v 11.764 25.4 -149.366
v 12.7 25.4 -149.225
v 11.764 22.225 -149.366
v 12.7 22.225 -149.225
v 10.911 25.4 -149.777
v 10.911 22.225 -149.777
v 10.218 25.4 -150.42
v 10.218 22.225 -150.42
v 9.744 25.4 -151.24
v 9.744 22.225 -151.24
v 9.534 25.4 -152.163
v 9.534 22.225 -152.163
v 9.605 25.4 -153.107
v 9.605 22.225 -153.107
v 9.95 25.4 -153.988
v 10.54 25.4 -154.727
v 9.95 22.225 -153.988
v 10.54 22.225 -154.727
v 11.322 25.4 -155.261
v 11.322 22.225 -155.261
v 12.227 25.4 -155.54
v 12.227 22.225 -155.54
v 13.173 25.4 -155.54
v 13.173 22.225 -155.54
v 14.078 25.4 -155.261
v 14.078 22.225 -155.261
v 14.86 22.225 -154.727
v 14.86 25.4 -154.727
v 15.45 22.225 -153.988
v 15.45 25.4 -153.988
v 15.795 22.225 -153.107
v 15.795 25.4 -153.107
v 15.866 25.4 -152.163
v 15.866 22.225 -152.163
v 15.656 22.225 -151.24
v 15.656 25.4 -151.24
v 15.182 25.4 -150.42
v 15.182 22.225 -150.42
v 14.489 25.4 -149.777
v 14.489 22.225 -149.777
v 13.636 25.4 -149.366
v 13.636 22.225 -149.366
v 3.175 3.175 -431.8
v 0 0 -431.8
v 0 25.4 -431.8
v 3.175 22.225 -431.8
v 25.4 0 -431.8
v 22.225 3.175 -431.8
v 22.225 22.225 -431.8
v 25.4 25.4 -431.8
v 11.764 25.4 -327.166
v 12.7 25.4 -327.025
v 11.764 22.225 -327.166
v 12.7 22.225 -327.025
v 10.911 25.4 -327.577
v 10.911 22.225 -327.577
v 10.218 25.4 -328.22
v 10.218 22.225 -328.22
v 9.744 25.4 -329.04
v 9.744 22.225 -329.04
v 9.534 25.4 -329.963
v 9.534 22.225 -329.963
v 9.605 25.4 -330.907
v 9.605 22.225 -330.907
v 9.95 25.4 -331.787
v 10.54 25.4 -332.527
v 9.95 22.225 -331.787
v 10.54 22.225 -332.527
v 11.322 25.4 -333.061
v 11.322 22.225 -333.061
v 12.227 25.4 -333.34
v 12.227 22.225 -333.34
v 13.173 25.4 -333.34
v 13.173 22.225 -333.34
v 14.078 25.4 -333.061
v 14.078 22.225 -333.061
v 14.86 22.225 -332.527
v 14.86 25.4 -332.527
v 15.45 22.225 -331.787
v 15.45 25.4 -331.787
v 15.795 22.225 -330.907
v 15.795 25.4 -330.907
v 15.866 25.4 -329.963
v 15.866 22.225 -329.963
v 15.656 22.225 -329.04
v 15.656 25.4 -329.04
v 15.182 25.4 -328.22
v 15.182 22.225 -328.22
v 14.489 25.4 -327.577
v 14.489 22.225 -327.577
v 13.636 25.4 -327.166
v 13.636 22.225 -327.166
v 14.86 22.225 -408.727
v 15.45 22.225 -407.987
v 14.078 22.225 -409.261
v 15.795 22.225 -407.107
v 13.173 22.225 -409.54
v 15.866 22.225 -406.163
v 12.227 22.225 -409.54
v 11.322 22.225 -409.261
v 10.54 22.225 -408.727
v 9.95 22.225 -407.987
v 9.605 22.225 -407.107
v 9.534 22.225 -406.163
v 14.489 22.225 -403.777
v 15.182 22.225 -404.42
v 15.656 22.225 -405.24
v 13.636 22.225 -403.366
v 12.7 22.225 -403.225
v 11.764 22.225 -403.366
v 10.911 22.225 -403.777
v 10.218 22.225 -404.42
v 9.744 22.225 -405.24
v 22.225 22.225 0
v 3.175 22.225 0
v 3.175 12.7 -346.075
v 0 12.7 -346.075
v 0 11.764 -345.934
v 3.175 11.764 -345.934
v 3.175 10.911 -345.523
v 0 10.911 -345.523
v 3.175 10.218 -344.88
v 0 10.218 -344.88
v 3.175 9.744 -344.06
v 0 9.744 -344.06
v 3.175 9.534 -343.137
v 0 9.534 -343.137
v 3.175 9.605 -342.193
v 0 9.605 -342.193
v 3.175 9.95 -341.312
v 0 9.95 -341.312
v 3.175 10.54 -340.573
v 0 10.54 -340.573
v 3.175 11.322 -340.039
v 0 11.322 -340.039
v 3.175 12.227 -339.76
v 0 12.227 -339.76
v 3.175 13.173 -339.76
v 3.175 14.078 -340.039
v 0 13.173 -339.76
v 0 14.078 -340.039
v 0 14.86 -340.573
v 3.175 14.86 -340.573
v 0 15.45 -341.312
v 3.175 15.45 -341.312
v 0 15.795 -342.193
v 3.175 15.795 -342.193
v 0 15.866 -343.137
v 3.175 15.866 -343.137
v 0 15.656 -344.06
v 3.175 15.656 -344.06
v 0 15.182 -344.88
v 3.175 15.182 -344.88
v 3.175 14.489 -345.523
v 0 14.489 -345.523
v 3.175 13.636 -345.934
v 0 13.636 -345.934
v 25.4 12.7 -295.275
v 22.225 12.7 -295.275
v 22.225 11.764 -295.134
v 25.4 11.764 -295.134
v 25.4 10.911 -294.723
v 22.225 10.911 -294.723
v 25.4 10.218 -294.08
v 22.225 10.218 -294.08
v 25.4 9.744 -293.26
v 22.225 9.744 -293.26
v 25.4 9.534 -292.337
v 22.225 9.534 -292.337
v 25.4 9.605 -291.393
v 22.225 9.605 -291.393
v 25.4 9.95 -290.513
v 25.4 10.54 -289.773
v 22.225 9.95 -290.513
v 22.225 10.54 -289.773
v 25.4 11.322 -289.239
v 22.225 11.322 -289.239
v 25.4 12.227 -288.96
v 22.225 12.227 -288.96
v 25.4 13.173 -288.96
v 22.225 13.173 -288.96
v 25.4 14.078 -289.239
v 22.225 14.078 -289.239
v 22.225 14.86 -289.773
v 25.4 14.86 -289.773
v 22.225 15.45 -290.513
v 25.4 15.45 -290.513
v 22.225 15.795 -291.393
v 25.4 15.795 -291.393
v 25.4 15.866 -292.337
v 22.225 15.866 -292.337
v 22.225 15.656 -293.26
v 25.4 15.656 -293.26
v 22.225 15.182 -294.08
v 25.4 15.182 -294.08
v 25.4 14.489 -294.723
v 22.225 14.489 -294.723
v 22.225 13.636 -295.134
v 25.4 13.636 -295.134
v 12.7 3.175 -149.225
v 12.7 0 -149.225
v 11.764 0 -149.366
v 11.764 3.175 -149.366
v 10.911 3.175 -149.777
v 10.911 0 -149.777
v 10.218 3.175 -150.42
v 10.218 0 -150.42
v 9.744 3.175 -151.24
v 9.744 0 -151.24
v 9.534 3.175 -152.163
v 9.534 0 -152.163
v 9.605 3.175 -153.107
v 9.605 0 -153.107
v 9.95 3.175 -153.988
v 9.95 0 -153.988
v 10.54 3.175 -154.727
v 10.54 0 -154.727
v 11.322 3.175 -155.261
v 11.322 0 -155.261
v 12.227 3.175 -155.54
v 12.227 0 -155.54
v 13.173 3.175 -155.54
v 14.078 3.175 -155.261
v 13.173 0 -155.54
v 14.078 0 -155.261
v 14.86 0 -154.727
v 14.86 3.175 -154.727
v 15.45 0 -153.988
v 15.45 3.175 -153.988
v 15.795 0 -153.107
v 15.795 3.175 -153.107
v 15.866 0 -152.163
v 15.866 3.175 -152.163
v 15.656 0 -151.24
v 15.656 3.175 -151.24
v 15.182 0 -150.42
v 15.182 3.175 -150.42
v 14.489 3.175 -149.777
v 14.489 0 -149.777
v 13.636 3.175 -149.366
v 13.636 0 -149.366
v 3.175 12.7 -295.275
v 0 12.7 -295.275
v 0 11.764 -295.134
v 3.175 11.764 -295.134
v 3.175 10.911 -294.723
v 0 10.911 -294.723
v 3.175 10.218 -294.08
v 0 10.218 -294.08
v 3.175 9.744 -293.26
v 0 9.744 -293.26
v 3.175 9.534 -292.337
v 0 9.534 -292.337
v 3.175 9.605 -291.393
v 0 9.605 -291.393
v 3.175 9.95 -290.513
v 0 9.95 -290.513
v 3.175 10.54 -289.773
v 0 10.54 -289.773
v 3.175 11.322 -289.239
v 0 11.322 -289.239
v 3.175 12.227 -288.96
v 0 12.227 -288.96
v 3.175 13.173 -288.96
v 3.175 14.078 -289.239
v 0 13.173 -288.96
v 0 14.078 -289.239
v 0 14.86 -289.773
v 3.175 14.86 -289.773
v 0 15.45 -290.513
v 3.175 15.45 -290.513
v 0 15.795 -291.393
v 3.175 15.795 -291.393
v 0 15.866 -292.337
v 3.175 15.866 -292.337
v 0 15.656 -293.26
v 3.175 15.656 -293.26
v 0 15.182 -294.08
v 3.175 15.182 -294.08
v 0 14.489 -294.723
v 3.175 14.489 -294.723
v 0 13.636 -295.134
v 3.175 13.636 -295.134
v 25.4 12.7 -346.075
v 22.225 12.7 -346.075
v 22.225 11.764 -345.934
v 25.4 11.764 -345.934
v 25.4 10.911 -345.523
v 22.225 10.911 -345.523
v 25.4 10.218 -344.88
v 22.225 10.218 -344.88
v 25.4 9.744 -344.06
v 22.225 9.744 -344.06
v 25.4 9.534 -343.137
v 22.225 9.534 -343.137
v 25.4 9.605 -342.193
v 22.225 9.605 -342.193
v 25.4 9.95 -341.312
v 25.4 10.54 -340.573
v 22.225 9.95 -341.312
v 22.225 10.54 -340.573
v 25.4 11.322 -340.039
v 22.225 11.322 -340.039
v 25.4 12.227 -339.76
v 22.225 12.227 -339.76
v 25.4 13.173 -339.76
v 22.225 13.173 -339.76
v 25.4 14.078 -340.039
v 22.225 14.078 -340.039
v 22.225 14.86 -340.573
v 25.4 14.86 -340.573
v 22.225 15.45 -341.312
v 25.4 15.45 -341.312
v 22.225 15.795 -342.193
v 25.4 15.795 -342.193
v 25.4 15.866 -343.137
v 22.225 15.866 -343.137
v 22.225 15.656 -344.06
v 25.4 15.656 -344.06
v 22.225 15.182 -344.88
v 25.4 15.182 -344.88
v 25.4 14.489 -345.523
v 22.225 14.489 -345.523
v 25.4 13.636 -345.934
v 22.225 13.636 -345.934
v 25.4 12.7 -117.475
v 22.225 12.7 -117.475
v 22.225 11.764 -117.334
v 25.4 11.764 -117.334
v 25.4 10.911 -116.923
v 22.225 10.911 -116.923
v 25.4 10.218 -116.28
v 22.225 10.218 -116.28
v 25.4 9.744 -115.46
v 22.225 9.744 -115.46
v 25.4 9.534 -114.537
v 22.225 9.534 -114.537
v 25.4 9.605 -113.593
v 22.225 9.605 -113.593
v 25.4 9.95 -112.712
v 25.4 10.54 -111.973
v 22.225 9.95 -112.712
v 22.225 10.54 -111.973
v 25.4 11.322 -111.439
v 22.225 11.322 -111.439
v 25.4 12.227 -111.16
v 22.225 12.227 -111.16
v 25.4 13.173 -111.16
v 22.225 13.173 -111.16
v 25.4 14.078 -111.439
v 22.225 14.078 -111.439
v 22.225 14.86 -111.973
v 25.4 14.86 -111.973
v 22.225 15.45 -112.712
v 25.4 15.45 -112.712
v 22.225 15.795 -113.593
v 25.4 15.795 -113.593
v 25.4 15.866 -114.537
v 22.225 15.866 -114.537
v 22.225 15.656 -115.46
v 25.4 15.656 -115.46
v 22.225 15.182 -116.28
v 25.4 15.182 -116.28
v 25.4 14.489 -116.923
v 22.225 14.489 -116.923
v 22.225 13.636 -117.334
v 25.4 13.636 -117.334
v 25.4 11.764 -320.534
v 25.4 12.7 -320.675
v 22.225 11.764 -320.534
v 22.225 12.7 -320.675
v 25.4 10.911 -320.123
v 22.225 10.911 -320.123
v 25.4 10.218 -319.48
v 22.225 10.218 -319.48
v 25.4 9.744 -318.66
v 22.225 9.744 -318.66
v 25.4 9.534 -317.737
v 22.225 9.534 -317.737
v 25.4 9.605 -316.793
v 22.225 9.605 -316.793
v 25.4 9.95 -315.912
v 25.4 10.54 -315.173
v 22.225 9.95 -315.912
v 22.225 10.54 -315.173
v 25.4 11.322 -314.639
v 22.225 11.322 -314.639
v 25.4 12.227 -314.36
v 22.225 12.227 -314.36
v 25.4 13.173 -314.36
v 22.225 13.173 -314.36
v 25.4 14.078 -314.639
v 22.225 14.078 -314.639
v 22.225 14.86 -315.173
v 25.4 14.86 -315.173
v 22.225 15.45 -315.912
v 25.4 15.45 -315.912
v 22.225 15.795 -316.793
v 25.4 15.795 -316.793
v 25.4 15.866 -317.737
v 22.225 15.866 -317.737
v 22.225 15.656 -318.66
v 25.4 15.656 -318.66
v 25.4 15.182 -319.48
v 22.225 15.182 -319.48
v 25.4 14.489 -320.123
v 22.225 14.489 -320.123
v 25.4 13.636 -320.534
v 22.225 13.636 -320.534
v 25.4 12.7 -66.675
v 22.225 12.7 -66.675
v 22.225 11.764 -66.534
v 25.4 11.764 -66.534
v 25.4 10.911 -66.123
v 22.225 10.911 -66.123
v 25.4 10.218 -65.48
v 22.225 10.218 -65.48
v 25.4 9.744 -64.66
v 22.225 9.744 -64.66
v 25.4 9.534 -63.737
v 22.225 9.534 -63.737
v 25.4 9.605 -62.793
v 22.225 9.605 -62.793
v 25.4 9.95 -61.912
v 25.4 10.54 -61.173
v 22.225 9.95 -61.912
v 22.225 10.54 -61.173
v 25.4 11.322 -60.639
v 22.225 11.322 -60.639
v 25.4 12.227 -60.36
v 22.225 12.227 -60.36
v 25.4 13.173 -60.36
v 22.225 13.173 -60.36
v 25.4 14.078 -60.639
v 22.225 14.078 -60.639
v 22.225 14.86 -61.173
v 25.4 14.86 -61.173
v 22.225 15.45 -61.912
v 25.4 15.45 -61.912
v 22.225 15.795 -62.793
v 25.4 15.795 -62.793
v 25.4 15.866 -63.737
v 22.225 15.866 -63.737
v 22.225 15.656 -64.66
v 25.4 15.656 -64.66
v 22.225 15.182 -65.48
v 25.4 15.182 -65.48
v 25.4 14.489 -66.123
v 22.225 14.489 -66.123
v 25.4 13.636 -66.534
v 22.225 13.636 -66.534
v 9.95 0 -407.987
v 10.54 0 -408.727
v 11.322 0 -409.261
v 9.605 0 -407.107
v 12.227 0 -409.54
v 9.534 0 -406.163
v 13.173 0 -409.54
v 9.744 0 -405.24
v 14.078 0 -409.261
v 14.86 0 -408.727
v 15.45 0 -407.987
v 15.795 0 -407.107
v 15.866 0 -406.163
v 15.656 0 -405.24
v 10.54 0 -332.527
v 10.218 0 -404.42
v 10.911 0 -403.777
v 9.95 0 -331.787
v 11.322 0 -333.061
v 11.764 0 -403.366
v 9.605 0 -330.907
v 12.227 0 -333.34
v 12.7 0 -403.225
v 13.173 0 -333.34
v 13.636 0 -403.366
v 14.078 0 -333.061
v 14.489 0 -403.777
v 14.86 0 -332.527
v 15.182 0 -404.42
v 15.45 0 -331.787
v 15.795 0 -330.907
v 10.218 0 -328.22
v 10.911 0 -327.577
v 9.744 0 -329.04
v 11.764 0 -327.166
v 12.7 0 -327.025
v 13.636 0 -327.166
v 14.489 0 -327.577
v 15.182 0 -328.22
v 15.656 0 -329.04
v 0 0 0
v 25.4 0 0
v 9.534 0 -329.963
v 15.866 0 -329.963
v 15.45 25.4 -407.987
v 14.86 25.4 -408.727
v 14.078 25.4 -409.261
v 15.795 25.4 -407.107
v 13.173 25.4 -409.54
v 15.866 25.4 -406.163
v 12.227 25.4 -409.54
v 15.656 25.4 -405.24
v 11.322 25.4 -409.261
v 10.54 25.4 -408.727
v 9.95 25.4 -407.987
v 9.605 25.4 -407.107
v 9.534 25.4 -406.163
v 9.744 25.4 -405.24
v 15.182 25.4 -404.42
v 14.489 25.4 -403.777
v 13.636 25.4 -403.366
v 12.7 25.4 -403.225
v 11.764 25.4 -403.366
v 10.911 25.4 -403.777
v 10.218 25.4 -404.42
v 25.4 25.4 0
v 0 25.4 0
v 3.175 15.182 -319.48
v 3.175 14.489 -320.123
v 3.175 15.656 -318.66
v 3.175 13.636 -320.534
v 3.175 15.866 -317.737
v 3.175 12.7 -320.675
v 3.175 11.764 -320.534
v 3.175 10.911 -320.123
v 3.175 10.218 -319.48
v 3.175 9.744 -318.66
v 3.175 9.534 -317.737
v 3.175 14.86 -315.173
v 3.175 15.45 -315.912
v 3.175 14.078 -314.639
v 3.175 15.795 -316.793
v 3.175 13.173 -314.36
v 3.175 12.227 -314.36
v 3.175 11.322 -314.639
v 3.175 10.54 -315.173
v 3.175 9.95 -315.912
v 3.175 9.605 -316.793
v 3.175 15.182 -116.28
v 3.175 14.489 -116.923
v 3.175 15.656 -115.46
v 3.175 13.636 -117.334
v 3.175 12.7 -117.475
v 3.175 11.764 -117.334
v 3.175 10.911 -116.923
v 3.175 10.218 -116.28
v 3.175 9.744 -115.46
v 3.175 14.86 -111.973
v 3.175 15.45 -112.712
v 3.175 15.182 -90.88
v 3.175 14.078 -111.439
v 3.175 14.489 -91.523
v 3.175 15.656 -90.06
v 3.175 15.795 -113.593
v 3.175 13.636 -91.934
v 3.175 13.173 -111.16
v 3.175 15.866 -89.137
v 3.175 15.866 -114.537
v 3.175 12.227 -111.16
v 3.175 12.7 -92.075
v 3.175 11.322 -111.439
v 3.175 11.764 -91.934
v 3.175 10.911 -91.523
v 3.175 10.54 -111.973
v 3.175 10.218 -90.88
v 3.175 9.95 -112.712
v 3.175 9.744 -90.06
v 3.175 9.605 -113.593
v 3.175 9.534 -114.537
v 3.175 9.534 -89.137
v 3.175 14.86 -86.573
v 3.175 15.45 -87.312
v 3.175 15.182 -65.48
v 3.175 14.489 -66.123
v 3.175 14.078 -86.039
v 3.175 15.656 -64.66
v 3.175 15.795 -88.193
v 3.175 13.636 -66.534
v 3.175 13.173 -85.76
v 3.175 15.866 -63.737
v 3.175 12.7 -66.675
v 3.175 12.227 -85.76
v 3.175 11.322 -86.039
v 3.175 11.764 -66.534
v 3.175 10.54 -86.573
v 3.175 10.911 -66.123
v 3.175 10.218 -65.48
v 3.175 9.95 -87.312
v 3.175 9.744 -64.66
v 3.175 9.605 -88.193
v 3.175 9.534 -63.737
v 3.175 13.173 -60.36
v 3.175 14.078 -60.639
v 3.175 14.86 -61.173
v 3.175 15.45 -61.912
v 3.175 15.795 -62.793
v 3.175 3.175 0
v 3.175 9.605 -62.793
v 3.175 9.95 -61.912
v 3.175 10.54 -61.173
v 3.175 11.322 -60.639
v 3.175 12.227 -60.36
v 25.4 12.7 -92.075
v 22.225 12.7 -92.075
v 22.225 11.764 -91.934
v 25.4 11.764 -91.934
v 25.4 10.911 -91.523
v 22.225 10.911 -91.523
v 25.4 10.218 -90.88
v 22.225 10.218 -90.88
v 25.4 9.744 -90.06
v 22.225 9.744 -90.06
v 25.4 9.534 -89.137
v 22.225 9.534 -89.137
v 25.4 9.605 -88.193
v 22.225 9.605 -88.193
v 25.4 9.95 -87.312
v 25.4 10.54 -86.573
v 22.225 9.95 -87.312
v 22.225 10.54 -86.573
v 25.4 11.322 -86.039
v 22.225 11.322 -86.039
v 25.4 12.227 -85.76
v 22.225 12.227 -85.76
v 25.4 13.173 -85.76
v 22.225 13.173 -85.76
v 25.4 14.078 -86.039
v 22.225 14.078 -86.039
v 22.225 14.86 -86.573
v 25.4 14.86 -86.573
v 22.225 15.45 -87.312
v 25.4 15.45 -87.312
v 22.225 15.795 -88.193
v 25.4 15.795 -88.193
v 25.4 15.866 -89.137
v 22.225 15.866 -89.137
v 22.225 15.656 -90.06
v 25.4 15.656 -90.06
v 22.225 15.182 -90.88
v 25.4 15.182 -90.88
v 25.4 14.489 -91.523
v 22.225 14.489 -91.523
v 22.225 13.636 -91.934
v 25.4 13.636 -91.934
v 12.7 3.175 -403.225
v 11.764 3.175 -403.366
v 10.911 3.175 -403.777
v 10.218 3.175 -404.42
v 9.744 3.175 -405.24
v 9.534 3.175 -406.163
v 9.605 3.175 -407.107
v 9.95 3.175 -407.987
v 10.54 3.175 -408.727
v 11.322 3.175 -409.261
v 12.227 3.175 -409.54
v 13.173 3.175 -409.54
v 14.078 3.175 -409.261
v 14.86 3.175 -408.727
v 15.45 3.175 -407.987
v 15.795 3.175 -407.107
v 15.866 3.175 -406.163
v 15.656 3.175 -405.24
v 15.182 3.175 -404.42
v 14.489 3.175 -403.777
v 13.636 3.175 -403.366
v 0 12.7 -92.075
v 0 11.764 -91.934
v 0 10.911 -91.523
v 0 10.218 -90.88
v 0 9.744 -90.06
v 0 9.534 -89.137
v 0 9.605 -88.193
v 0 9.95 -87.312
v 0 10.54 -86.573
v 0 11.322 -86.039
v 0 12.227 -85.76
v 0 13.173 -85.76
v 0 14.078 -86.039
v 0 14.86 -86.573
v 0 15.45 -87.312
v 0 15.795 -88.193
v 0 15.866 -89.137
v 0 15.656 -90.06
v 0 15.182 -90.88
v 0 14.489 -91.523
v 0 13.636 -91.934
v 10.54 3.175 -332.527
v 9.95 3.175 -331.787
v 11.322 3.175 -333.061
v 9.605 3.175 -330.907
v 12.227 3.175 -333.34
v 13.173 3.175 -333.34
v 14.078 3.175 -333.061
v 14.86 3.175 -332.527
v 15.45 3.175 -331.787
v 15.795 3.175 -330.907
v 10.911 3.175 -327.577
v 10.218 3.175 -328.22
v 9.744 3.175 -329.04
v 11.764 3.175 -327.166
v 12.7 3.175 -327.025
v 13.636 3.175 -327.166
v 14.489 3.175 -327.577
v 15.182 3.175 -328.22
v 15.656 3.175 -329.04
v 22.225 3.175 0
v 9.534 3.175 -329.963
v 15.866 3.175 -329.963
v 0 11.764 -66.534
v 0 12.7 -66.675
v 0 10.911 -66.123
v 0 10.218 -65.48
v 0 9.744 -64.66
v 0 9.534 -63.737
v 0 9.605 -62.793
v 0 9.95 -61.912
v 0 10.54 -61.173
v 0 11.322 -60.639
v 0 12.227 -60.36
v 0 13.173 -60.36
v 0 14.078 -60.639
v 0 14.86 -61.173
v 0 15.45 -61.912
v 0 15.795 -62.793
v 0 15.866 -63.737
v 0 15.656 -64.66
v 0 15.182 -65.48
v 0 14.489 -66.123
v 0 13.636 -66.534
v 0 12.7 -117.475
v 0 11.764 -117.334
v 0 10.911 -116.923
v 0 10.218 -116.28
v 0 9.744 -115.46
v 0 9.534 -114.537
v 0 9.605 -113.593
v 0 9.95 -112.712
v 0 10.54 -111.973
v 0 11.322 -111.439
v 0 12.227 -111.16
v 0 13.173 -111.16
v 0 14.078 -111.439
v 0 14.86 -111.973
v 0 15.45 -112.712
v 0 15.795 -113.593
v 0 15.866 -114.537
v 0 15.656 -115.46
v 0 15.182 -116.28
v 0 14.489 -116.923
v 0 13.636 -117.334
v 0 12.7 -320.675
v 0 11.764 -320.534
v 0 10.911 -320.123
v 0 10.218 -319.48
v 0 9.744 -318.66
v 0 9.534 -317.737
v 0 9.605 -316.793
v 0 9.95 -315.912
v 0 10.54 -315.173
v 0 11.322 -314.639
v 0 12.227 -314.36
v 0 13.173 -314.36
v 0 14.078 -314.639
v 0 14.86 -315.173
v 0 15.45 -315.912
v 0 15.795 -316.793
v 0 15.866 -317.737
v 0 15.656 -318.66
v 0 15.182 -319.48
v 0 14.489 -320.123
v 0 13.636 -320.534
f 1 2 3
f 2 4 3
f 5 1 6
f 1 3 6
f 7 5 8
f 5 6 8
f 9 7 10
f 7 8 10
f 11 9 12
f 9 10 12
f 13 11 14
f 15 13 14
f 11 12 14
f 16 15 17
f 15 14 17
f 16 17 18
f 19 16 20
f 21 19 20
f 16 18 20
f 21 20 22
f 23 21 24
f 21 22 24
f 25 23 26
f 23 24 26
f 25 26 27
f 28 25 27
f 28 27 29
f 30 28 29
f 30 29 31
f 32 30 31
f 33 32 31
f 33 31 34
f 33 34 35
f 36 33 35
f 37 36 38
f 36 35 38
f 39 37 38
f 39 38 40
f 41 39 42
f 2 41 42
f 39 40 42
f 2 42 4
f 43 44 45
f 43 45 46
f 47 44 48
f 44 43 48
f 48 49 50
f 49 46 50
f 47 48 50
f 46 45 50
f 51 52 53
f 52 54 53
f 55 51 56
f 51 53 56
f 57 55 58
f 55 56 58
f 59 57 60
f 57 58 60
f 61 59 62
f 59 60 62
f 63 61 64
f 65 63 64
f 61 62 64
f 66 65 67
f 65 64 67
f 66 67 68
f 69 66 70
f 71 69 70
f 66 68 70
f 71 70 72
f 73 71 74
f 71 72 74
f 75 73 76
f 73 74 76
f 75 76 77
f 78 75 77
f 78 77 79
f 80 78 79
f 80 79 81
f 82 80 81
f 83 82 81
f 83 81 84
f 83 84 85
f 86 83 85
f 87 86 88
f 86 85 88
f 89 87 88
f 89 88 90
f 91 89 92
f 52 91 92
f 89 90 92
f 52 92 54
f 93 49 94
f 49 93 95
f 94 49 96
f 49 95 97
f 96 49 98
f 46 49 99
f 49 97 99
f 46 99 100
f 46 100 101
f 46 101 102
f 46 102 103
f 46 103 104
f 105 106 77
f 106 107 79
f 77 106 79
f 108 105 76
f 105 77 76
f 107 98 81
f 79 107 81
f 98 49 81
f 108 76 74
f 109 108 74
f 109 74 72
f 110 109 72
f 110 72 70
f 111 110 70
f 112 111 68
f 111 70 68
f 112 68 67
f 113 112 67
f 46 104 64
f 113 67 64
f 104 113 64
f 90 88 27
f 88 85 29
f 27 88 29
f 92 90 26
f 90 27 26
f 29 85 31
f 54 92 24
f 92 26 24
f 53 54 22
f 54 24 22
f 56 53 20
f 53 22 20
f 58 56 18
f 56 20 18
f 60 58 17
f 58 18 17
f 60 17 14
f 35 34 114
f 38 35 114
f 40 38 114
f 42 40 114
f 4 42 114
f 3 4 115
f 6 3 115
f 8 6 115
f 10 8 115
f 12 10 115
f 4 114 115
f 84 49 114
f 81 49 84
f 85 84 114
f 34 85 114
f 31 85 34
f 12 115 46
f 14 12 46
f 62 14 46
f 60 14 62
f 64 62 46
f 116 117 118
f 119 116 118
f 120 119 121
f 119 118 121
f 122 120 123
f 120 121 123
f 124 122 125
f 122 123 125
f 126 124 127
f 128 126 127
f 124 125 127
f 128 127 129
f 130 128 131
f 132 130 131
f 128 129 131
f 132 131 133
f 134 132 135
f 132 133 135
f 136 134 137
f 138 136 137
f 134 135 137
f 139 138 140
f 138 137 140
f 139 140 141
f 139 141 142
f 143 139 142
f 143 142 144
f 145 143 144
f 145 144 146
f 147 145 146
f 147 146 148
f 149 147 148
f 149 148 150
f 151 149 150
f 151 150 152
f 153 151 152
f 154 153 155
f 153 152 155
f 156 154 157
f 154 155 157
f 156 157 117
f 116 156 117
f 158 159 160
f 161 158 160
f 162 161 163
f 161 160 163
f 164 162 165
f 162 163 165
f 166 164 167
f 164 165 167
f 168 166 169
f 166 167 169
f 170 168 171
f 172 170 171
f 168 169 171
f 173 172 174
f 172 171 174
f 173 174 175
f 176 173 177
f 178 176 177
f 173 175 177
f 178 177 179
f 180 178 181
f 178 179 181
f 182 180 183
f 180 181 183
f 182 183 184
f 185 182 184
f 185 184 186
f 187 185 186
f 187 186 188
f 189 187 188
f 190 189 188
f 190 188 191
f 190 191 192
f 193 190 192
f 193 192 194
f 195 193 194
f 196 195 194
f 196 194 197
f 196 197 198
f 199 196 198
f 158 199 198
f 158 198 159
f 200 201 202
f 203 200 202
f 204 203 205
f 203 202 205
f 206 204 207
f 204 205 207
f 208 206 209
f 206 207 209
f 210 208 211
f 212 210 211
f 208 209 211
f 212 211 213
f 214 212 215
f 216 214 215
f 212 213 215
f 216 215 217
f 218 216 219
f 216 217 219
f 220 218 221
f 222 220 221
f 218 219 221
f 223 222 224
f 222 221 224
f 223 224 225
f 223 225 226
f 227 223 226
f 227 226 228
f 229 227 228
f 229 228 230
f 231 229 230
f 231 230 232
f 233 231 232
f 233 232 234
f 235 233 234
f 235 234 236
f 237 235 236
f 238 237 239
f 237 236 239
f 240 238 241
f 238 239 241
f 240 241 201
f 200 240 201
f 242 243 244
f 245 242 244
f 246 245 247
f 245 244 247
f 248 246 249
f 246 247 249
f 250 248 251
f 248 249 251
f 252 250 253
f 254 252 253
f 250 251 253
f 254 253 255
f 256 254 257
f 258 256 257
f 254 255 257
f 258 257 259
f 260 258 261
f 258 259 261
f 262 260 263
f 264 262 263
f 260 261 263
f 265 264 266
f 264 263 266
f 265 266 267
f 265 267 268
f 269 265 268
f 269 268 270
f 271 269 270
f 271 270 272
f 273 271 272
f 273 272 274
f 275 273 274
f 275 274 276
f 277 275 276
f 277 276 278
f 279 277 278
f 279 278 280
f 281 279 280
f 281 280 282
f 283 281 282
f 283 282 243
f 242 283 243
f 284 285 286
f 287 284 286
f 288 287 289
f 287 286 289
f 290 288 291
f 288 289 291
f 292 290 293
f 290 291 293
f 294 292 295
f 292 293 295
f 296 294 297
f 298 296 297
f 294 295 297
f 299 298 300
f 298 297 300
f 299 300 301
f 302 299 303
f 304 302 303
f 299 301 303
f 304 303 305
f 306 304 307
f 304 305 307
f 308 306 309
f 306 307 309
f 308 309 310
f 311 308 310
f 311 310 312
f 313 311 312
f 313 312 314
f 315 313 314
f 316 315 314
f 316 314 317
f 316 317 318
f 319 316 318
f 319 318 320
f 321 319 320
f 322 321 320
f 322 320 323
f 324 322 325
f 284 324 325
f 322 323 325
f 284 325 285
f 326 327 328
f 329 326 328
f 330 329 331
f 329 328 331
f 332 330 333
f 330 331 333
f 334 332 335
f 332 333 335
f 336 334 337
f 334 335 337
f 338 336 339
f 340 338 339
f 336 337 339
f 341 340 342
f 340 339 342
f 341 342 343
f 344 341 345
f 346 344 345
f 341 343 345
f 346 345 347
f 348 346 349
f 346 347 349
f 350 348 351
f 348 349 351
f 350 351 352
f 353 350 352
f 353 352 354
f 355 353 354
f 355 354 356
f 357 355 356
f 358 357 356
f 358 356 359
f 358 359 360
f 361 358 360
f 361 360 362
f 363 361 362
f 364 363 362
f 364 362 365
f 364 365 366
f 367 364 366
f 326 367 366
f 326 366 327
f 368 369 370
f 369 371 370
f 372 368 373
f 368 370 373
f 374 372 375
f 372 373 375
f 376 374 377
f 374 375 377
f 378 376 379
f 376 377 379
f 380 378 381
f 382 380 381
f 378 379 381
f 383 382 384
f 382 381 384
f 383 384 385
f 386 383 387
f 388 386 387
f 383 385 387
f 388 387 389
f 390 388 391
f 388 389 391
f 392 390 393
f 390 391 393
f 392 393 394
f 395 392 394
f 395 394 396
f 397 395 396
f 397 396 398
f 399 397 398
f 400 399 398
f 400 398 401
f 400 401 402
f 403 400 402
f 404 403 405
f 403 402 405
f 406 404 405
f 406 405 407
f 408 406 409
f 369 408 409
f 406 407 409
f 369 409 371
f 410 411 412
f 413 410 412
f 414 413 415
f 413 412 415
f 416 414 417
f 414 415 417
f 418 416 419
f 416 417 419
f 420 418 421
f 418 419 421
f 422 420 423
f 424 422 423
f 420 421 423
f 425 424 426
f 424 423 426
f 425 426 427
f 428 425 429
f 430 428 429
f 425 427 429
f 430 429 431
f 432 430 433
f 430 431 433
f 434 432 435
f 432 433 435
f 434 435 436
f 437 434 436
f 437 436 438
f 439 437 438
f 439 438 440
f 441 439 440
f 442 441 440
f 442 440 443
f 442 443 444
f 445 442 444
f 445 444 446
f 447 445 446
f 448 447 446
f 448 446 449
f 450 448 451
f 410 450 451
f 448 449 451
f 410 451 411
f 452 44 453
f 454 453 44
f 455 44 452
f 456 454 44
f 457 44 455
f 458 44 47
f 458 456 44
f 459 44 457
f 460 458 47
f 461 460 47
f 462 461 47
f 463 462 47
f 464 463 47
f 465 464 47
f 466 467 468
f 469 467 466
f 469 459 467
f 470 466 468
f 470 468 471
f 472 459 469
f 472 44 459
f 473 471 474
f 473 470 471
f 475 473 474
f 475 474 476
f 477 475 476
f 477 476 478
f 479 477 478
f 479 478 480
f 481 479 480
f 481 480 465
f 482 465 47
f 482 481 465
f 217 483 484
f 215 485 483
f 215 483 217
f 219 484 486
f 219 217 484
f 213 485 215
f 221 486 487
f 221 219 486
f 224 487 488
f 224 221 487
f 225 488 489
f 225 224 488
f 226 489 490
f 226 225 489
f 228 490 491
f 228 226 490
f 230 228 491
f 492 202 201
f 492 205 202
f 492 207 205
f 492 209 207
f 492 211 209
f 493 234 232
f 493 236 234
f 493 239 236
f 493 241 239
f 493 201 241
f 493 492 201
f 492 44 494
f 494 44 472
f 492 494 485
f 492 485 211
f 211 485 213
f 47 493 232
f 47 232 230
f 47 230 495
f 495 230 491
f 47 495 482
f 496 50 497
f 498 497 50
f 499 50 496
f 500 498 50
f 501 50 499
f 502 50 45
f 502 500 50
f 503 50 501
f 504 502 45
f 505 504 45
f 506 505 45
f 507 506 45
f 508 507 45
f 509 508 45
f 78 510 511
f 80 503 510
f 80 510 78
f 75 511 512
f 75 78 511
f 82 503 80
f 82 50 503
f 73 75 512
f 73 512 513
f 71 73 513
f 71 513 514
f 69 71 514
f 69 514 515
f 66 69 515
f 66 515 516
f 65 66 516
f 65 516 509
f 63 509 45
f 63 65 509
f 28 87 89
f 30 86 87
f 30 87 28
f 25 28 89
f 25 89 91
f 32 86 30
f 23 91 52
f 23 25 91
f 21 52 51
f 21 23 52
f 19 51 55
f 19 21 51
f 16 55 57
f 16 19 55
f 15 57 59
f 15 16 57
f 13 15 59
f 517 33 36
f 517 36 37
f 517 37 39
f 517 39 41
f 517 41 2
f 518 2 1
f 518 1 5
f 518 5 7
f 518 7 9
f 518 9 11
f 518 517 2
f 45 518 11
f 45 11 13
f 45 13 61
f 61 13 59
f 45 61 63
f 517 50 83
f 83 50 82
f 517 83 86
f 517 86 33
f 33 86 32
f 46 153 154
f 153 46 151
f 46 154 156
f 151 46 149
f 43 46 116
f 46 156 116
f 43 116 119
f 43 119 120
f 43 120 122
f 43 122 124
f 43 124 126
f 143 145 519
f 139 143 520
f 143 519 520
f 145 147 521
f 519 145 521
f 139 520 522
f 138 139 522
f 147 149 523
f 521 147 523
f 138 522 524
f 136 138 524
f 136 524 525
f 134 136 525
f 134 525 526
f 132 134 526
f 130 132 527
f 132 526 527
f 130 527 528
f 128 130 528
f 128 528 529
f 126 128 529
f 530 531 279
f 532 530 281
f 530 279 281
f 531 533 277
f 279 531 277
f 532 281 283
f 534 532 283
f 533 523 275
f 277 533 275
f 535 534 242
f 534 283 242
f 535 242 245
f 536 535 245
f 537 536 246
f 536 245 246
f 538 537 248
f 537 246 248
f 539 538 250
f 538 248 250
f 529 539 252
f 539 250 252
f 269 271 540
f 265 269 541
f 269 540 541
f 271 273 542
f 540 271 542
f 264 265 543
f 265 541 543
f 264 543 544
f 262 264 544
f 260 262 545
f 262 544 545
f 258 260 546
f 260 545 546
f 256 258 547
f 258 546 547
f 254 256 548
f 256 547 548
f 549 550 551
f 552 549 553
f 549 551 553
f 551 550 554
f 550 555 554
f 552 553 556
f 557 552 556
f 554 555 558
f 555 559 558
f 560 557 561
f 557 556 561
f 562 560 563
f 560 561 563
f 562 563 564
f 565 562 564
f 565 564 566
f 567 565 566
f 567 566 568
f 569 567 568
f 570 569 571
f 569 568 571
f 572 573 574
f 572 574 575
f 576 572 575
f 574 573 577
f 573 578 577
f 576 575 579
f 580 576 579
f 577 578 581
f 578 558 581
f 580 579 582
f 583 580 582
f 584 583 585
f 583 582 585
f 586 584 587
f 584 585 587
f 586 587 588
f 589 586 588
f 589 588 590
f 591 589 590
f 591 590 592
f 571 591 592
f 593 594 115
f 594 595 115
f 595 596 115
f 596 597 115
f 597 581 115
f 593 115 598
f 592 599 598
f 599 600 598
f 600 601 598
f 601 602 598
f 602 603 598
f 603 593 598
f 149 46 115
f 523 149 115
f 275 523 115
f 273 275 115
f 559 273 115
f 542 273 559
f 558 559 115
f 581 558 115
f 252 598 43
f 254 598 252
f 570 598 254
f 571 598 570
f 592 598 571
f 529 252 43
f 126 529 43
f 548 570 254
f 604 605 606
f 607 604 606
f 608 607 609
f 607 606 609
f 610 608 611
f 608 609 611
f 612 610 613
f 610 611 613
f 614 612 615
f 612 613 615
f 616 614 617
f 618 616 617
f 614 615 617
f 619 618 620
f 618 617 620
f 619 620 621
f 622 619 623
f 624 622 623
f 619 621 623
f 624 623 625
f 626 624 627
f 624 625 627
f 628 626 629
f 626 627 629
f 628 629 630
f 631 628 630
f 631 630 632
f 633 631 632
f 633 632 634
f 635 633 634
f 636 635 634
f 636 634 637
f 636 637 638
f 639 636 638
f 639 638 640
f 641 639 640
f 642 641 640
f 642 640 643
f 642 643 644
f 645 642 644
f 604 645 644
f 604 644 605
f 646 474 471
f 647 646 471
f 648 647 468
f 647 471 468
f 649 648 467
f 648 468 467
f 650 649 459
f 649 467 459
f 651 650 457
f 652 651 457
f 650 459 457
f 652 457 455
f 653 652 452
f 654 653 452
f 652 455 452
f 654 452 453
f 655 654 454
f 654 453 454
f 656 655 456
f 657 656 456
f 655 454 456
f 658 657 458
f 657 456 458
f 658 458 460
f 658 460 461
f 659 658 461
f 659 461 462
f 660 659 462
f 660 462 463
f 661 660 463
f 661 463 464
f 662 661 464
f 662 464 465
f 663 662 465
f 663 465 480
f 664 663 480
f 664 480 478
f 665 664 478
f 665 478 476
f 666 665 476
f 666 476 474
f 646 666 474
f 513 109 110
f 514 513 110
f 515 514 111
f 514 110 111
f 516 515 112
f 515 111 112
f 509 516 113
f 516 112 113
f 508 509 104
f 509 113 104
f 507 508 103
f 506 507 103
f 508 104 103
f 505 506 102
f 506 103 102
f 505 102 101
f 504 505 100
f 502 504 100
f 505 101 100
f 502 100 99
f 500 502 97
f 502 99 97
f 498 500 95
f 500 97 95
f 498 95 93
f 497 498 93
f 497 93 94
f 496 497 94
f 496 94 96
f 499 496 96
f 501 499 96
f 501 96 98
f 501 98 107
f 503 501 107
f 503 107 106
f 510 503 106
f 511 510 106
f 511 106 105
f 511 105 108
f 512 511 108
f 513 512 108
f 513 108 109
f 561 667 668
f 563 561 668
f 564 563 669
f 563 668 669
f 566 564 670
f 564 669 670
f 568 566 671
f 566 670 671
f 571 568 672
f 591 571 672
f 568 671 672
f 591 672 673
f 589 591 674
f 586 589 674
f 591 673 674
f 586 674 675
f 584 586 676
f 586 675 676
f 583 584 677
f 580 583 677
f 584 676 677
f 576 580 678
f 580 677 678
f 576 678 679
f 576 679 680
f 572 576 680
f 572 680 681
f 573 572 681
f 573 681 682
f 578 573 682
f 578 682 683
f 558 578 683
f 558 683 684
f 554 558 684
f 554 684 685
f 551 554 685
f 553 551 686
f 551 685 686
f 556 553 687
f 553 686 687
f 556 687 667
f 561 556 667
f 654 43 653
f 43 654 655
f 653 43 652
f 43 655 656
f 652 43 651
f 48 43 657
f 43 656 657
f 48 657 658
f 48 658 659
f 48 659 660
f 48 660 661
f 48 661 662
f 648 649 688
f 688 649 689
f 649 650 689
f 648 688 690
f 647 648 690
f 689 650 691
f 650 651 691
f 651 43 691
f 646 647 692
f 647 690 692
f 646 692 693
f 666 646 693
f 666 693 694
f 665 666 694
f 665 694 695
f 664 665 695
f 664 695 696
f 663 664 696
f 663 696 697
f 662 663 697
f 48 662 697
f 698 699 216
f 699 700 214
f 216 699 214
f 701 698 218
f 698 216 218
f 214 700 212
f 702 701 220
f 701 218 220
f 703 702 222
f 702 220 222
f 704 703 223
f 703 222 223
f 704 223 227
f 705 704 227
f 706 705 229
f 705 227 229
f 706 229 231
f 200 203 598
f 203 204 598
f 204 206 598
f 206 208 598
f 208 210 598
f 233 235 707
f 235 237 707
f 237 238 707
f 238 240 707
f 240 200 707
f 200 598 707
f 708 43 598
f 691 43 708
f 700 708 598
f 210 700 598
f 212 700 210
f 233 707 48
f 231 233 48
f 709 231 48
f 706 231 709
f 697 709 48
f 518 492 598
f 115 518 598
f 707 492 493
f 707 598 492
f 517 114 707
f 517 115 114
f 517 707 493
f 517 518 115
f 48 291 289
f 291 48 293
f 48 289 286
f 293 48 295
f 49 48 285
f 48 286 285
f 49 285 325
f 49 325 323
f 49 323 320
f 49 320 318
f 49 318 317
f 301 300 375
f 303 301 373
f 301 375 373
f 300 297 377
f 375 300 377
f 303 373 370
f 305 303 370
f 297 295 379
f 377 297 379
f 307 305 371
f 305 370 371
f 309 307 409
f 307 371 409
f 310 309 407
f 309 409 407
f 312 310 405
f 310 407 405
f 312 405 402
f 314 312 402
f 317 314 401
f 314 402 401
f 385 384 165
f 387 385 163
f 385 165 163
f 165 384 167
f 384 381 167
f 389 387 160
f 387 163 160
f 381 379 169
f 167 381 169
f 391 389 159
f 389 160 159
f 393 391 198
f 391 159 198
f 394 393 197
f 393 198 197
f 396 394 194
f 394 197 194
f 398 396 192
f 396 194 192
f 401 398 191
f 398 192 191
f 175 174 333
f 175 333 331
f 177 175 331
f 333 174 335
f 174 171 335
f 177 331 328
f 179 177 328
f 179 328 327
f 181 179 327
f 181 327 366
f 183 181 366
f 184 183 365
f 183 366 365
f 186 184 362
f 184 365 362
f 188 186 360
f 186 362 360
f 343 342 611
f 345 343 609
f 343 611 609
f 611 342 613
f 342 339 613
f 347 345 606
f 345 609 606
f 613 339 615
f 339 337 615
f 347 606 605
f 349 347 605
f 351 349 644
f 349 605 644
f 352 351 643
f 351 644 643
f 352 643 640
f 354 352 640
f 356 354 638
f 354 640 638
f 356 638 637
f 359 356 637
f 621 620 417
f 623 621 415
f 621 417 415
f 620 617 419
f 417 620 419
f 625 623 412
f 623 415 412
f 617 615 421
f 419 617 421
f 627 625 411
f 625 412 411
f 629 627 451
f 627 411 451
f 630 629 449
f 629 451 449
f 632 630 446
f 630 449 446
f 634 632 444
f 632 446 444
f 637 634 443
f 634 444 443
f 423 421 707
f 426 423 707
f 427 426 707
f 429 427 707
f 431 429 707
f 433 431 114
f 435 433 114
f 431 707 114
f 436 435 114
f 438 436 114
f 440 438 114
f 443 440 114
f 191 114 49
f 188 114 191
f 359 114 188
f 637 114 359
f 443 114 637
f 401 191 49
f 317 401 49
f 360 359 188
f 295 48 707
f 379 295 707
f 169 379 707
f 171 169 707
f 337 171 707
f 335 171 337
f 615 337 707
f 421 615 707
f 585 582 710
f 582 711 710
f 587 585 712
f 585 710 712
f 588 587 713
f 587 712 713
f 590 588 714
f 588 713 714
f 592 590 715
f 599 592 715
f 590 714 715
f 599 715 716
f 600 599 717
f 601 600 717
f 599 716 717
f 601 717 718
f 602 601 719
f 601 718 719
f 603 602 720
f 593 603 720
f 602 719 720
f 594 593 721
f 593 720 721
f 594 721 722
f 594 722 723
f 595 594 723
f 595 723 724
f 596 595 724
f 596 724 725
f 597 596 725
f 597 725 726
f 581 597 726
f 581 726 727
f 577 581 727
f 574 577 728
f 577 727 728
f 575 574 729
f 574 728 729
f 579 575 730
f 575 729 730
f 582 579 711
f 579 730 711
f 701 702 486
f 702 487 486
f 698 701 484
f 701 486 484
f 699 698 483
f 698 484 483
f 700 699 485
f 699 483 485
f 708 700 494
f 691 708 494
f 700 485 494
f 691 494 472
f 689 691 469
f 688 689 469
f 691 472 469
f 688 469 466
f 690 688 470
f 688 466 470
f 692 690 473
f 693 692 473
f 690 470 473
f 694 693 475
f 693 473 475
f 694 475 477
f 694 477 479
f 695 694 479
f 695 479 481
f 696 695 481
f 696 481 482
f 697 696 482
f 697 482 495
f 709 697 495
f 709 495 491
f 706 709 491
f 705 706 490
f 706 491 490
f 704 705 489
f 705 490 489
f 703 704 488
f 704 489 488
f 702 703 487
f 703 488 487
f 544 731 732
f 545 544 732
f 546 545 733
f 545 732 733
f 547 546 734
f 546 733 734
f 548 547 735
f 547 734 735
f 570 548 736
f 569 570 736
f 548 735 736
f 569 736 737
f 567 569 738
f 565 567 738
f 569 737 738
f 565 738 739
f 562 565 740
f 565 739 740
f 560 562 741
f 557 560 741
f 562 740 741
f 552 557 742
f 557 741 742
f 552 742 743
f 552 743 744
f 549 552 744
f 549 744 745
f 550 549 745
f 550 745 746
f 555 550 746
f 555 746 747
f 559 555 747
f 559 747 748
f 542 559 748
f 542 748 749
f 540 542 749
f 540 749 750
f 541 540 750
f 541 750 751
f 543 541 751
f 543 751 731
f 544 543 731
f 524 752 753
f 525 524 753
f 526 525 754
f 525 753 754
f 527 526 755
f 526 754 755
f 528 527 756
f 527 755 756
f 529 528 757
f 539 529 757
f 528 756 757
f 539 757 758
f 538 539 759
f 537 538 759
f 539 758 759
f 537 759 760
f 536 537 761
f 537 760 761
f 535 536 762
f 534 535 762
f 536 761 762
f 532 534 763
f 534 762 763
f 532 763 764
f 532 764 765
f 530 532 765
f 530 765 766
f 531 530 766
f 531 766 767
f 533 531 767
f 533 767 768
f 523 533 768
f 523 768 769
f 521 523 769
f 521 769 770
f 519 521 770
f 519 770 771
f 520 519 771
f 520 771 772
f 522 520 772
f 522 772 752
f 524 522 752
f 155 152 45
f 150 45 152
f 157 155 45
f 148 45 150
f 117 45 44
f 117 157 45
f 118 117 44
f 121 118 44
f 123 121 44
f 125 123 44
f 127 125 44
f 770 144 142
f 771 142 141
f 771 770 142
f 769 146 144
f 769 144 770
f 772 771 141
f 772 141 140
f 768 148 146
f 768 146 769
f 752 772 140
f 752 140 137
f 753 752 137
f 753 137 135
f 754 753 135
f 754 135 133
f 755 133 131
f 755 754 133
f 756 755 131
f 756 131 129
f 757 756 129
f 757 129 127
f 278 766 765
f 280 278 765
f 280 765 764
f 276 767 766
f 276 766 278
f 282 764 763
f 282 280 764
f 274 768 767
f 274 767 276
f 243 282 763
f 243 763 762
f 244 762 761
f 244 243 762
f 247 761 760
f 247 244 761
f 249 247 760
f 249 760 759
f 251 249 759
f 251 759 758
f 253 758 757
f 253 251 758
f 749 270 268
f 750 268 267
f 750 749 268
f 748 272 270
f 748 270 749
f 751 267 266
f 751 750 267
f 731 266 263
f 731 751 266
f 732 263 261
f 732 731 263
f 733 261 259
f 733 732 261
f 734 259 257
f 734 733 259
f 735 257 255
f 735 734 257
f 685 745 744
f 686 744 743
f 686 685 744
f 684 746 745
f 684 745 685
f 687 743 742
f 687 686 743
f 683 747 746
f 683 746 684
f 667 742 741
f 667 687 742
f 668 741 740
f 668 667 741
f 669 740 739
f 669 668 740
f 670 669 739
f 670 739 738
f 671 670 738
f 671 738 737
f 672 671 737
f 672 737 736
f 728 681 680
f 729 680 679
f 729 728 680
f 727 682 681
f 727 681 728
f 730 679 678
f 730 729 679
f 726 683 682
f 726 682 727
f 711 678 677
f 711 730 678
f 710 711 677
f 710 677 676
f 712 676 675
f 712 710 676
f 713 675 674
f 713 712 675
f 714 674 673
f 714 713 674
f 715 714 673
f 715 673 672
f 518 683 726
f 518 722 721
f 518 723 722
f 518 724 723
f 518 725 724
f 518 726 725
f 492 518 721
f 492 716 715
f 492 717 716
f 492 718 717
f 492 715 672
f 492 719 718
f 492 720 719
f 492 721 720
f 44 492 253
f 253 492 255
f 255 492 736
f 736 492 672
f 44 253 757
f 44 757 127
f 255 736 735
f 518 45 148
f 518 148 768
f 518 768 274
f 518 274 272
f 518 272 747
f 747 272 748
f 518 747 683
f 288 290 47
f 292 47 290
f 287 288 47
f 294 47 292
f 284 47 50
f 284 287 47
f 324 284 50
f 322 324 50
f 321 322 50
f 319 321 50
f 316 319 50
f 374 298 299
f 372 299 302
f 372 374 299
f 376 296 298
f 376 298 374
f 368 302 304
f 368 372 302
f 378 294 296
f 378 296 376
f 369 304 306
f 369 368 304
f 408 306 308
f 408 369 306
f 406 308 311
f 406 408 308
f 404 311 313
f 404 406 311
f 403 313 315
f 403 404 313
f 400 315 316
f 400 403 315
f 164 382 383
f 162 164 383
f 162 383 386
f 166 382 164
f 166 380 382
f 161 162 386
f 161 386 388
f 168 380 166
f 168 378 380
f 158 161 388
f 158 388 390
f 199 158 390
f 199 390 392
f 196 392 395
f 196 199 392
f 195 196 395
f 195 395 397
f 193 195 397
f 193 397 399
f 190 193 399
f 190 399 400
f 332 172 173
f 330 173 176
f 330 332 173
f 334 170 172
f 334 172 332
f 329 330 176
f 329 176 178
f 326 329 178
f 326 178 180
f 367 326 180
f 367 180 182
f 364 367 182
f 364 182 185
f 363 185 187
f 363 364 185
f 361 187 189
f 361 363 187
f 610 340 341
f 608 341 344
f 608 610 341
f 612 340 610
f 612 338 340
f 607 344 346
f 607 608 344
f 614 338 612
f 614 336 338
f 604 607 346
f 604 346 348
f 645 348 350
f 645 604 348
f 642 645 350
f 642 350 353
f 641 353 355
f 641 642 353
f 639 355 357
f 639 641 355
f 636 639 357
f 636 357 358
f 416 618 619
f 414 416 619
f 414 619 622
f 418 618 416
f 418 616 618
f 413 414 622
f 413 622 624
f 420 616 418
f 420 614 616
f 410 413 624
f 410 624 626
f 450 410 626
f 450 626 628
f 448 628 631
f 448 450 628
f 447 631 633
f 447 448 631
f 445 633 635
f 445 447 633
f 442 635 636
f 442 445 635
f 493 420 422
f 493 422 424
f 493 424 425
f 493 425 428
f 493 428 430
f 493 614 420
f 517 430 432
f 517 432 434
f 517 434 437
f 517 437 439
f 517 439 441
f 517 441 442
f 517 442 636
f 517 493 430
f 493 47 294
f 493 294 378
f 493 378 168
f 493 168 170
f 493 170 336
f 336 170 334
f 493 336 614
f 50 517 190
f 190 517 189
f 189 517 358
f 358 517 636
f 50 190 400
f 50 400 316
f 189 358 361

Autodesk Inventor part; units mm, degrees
ref_plane "YZ Plane" through (0, 0, 0) normal (1, 0, 0) x (0, 1, 0)
ref_plane "XZ Plane" through (0, 0, 0) normal (0, 1, 0) x (-1, 0, 0)
ref_plane "XY Plane" through (0, 0, 0) normal (0, 0, 1) x (1, 0, 0)
sketch "Sketch1" plane through (0, 0, 0) normal (0, 0, 1) x (1, 0, 0)
  line L0 (0, 0) -> (25.4, 0)
  line L1 (25.4, 0) -> (25.4, 25.4)
  line L2 (25.4, 25.4) -> (0, 25.4)
  line L3 (0, 25.4) -> (0, 0)
  line L4 (3.175, 3.175) -> (22.225, 3.175)
  line L5 (22.225, 3.175) -> (22.225, 22.225)
  line L6 (22.225, 22.225) -> (3.175, 22.225)
  line L7 (3.175, 22.225) -> (3.175, 3.175)
  dimension "d0" = 25.4
  dimension "d1" = 25.4
  dimension "d2" = 3.175
extrude "Extrusion1" add sketch "Sketch1" against normal blind 431.8
sketch "Sketch2" plane through (0, 25.4, 0) normal (0, 1, 0) x (1, 0, 0)
  line L0 (25.4, 431.8) -> (0, 431.8) projected
  point P0 (12.7, 406.4)
  point P1 (12.7, 330.2)
  point P2 (12.7, 152.4)
  dimension "d5" = 25.4
  dimension "d6" = 76.2
  dimension "d7" = 177.8
hole "Hole1" at (12.7, 25.4, -406.4) at (12.7, 25.4, -330.2) at (12.7, 25.4, -152.4) direction (0, -1, 0) diameter 6.35 depth 25.4 tip angle 118
sketch "Sketch3" plane through (25.4, 0, 0) normal (1, 0, 0) x (0, 0, -1)
  line L0 (0, 0) -> (0, 25.4) projected
  line L1 (0, 0) -> (431.8, 0) projected
  line L2 (431.8, 0) -> (431.8, 25.4) projected
  point P0 (63.5, 12.7)
  point P1 (88.9, 12.7)
  point P2 (114.3, 12.7)
  point P3 (342.9, 12.7)
  point P4 (317.5, 12.7)
  point P5 (292.1, 12.7)
  point P6 (431.8, 12.7)
  dimension "d15" = 12.7
  dimension "d16" = 25.4
  dimension "d17" = 25.4
  dimension "d18" = 63.5
  dimension "d26" = 25.4
  dimension "d27" = 25.4
  dimension "d28" = 88.9
hole "Hole2" at (25.4, 12.7, -63.5) at (25.4, 12.7, -88.9) at (25.4, 12.7, -114.3) direction (-1, 0, 0) diameter 6.35 depth 25.4 tip angle 118
hole "Hole3" at (25.4, 12.7, -342.9) at (25.4, 12.7, -317.5) at (25.4, 12.7, -292.1) direction (-1, 0, 0) diameter 6.35 depth 25.4 tip angle 118
properties part number "12 in tube"
